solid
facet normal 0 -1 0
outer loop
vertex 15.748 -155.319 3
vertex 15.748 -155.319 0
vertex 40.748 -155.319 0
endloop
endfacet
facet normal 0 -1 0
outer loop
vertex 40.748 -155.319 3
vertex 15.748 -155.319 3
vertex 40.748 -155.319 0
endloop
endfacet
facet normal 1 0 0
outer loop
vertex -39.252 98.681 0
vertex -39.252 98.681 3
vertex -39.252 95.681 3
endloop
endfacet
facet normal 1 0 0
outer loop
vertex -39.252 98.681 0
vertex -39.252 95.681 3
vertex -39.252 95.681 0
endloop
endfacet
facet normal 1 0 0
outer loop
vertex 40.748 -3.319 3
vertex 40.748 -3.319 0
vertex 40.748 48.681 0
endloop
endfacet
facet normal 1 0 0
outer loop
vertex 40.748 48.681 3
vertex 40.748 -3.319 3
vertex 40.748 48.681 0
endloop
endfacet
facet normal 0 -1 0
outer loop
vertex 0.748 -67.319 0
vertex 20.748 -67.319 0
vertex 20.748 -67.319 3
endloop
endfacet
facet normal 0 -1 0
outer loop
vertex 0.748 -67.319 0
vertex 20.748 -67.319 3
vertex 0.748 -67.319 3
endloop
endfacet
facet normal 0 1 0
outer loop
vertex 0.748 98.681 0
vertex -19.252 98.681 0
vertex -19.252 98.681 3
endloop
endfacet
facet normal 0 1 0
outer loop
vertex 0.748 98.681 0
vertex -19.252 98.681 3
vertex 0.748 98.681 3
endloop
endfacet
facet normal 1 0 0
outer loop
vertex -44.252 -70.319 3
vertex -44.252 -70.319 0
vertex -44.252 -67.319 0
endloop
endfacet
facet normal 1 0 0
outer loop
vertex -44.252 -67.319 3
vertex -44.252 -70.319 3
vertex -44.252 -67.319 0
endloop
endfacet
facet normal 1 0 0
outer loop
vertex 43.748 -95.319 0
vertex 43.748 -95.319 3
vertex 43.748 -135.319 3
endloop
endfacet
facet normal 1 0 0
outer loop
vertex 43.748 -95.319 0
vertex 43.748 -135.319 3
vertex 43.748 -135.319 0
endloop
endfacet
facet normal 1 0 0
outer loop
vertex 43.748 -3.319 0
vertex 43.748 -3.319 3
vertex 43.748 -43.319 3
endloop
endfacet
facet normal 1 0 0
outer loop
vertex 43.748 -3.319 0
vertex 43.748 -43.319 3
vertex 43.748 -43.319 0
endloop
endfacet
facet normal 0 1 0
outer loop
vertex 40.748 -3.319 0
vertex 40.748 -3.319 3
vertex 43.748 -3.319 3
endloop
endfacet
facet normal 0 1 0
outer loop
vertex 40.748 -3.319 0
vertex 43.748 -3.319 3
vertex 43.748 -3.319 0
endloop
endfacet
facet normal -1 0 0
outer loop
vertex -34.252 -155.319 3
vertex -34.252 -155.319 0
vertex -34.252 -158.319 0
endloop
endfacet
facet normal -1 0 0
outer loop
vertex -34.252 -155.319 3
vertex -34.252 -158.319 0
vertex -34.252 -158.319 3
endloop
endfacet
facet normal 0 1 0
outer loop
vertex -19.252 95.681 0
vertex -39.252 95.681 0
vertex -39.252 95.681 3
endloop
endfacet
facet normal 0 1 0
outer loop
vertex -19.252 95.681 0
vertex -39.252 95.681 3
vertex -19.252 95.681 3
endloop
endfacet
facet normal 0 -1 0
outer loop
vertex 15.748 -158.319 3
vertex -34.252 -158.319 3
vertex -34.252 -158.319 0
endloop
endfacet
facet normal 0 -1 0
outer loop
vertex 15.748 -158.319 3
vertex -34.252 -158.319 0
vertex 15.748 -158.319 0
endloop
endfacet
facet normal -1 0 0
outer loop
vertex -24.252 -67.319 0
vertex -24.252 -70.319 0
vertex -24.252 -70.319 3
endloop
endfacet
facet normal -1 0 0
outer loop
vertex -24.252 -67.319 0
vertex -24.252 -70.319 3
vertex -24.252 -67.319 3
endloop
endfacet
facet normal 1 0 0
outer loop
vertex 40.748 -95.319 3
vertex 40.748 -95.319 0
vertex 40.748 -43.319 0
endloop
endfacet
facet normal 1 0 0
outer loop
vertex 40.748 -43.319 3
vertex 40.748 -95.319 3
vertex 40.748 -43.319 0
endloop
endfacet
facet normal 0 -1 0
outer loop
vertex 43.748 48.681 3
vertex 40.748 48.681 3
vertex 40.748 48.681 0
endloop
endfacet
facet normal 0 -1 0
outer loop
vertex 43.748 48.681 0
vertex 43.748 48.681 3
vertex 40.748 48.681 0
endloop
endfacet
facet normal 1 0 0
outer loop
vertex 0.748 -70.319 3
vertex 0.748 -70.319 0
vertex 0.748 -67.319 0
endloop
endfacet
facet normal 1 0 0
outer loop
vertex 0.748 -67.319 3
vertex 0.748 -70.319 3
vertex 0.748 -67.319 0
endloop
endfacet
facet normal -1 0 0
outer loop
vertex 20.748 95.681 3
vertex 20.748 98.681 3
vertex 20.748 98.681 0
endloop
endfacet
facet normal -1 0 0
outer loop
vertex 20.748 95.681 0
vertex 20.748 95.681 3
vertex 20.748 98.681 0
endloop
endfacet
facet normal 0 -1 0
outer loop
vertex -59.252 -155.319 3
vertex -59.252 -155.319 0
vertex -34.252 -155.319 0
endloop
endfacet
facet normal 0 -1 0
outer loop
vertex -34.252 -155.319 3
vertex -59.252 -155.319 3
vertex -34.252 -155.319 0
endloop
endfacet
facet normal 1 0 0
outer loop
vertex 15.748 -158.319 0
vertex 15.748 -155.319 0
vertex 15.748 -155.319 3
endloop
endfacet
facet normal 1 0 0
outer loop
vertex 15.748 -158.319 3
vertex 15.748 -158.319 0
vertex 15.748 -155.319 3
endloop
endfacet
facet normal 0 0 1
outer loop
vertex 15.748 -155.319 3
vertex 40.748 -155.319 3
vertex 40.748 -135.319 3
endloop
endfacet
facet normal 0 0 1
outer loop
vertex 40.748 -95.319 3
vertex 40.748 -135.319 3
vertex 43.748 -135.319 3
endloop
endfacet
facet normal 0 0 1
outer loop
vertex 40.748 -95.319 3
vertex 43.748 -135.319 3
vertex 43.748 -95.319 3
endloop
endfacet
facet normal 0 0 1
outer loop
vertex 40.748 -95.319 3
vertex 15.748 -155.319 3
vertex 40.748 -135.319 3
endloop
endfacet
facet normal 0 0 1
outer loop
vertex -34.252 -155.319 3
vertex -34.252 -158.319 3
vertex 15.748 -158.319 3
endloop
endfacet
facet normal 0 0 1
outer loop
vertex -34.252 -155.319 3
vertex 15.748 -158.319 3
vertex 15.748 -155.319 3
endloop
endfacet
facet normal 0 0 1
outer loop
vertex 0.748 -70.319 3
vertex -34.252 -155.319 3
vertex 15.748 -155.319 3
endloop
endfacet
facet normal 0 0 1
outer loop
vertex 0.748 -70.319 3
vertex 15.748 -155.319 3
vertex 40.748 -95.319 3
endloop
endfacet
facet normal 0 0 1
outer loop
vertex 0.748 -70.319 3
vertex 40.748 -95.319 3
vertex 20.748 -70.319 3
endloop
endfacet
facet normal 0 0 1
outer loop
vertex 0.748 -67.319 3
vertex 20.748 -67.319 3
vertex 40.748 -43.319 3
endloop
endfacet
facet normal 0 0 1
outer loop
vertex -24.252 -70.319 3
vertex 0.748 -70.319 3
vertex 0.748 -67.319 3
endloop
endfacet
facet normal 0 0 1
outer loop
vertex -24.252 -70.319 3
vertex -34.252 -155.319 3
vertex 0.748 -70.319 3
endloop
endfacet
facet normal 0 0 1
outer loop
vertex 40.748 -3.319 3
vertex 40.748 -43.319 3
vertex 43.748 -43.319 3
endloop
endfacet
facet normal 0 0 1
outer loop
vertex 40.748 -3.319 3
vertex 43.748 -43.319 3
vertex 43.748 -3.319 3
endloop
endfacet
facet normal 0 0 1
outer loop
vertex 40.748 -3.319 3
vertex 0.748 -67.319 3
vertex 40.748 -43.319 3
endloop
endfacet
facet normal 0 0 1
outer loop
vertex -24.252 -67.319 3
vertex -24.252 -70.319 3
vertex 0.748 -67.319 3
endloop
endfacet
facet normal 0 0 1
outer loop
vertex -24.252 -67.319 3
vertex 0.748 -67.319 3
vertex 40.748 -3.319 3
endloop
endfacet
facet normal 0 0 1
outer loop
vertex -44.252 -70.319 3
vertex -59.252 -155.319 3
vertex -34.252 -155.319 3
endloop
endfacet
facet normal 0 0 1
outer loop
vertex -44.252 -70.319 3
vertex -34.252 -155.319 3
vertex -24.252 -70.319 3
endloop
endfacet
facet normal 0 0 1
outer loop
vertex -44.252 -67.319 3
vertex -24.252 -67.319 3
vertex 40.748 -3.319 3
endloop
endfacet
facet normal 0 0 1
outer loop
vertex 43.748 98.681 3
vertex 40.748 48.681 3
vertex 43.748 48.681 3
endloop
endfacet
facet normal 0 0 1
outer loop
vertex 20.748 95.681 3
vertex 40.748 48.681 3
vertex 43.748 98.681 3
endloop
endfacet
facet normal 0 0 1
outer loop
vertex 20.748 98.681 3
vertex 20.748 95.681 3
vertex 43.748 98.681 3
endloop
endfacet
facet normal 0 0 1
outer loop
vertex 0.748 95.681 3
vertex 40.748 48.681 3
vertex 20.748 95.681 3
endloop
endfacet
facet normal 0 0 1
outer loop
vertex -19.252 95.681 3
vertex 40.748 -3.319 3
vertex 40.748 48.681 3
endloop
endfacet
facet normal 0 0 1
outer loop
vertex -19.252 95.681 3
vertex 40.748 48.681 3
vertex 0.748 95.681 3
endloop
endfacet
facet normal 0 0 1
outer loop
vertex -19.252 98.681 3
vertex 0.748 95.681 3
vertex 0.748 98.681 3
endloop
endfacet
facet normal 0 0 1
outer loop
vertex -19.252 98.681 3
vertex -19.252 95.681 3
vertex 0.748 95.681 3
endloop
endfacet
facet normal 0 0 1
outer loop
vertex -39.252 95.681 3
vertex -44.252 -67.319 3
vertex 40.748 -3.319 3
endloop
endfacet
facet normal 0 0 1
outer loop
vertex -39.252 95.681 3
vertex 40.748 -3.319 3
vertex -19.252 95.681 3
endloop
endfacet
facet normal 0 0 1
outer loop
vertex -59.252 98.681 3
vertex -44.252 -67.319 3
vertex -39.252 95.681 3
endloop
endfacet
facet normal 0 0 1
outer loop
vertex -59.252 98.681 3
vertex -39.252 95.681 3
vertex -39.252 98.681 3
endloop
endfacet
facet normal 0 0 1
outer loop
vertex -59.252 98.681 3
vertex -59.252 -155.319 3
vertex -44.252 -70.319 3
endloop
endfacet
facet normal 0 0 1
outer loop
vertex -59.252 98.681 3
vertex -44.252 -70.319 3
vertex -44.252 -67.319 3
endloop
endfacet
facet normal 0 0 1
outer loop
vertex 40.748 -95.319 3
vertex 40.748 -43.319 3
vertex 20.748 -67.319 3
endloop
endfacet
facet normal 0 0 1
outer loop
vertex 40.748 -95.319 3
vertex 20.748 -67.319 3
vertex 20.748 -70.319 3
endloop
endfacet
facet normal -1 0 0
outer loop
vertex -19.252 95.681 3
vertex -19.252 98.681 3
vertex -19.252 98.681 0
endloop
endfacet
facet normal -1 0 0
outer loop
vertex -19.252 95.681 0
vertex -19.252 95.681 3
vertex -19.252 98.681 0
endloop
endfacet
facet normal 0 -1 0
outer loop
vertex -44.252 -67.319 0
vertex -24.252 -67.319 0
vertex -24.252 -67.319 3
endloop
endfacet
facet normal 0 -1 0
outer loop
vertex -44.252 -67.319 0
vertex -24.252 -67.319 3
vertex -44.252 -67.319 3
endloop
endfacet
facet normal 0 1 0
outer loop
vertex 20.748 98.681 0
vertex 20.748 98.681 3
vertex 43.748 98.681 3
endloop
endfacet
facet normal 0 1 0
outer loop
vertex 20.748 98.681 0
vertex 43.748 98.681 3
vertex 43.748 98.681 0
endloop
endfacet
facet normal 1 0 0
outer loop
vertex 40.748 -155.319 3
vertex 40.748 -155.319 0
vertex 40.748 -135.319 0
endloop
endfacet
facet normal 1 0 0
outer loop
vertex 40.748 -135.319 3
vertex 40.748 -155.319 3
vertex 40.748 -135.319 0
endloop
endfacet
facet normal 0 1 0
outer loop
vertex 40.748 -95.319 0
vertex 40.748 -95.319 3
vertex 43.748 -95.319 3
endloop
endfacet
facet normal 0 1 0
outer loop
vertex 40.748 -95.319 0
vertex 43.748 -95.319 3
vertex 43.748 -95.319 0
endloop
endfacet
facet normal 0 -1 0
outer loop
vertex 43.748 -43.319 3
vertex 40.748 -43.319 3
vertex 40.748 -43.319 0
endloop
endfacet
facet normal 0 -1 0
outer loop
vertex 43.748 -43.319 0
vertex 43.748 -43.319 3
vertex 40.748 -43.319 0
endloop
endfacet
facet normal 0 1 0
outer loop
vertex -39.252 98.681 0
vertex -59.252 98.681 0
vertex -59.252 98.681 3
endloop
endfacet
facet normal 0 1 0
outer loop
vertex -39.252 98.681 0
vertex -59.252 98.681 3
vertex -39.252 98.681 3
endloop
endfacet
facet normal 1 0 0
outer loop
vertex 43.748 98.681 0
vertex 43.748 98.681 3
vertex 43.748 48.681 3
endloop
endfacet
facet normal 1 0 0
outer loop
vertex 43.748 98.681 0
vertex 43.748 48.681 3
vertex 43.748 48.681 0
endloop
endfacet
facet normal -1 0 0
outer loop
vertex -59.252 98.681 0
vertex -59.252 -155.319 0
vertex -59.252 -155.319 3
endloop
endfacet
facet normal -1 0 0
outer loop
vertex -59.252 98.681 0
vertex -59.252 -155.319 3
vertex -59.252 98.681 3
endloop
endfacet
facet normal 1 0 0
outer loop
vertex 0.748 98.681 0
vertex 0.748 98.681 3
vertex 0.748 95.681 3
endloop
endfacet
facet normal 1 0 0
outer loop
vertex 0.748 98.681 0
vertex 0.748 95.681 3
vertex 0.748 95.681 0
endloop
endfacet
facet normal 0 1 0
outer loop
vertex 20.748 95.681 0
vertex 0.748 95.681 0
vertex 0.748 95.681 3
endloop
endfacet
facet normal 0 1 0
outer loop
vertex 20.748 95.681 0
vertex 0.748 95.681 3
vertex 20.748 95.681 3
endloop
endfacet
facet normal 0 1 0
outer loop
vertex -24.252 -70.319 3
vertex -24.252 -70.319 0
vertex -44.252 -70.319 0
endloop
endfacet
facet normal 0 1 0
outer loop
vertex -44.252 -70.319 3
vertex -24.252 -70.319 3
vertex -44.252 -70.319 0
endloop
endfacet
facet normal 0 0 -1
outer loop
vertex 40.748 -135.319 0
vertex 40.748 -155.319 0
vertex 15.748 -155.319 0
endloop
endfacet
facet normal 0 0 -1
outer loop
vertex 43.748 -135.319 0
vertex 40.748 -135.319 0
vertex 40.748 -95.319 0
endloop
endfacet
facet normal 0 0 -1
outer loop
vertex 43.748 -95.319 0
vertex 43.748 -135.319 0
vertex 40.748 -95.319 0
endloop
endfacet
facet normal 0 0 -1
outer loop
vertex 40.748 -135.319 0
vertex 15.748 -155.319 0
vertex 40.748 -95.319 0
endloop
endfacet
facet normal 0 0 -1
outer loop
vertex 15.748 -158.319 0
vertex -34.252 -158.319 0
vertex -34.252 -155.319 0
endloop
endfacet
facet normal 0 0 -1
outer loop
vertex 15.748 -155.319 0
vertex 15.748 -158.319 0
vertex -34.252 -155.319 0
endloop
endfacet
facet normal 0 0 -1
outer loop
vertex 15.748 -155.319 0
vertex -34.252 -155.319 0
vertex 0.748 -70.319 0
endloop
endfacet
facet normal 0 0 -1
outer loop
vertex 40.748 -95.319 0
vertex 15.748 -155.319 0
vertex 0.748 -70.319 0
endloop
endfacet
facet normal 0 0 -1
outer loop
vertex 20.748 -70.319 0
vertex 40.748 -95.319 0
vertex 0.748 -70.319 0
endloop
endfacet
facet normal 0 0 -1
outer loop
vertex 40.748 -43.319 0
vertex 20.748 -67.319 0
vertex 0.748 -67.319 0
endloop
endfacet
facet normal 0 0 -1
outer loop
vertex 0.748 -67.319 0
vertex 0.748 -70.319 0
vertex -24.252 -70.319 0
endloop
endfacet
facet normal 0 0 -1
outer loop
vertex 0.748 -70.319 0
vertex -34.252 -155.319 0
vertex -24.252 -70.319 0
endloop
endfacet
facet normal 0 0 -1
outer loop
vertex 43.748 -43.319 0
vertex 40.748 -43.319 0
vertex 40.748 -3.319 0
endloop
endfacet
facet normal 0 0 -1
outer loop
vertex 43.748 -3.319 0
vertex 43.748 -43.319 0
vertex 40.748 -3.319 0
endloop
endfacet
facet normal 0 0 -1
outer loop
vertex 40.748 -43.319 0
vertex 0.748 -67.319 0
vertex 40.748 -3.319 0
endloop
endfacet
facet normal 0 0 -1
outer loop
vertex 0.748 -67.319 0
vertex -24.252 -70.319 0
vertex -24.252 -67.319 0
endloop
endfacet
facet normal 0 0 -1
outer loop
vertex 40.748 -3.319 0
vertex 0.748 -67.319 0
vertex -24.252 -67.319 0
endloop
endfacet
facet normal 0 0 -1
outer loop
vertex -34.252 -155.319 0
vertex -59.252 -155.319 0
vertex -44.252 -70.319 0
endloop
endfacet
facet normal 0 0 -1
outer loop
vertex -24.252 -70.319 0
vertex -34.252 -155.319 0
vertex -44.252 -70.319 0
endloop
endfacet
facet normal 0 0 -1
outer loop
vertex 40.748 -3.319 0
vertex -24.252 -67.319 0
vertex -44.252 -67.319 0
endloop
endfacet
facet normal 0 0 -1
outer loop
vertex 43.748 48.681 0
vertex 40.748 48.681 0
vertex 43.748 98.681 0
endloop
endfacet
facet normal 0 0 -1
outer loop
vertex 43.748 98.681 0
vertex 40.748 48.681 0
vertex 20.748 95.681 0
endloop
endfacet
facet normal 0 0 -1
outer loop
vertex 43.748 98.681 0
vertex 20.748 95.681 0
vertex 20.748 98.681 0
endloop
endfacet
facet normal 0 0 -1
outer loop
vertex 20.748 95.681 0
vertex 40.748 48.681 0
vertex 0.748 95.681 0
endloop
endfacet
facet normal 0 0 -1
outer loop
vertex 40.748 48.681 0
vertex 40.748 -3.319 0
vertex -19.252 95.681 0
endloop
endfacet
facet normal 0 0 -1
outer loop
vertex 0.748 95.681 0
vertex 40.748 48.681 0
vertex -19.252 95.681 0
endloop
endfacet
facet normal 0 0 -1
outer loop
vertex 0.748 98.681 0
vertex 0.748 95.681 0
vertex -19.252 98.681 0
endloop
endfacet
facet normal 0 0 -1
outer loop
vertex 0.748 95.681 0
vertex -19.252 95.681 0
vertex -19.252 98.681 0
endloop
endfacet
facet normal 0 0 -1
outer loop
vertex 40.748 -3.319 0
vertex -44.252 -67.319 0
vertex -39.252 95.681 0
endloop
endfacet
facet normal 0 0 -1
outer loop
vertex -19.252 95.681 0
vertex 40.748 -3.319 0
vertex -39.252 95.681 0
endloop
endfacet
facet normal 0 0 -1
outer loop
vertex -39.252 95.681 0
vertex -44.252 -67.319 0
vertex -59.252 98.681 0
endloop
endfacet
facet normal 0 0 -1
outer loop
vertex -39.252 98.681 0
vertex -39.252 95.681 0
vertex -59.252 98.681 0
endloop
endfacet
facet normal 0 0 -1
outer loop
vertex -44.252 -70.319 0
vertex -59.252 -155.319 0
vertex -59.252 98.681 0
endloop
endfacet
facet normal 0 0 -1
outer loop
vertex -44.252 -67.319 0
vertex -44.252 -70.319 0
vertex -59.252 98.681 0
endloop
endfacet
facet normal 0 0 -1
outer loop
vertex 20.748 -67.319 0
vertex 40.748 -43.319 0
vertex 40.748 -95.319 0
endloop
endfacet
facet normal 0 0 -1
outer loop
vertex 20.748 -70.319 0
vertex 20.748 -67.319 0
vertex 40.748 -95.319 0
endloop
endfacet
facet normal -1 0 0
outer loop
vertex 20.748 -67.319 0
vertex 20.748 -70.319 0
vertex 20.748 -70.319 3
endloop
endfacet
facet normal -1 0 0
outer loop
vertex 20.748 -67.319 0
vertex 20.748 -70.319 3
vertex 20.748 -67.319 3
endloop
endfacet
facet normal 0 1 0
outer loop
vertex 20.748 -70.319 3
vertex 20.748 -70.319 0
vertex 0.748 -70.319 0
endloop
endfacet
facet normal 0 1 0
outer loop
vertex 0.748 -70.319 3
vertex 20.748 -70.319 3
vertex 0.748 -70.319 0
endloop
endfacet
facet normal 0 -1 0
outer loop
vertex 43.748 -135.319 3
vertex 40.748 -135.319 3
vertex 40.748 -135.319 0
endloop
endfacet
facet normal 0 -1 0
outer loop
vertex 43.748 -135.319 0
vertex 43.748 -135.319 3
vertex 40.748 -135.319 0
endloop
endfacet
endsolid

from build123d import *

# Parameters (mm, degrees)
SKETCH1_W           = 100
SKETCH1_H           = 254
BOSS_EXTRUDE1_DEPTH = 3
SKETCH2_W           = 50
SKETCH2_H           = 3
BOSS_EXTRUDE2_DEPTH = 3
SKETCH3_W           = 20
SKETCH3_H           = 3
CUT_EXTRUDE1_DEPTH  = 3
SKETCH4_W           = 3
SKETCH4_H           = 40
SKETCH4_H_2         = 50
BOSS_EXTRUDE3_DEPTH = 3
SKETCH5_W           = 20
SKETCH5_H           = 3
CUT_EXTRUDE2_DEPTH  = 3


with BuildPart() as part:
    # Sketch1 → Boss-Extrude1 (new body)
    with BuildSketch(Plane.XY):
        with Locations((-9.252144082, -28.319039451)):
            Rectangle(SKETCH1_W, SKETCH1_H)
    extrude(amount=BOSS_EXTRUDE1_DEPTH)

    # Sketch2 → Boss-Extrude2 (add)
    with BuildSketch(Plane.XZ.offset(155.319039451)):
        with Locations((-9.252144082, 1.5)):
            Rectangle(SKETCH2_W, SKETCH2_H)
    extrude(amount=BOSS_EXTRUDE2_DEPTH)

    # Sketch3 → Cut-Extrude1 (cut)
    with BuildSketch(Plane(origin=(0, 98.680960549, 0), x_dir=(1, 0, 0), z_dir=(0, 1, 0))):
        with Locations((-29.252144082, -1.5)):
            Rectangle(SKETCH3_W, SKETCH3_H)
        with Locations((10.747855918, -1.5)):
            Rectangle(SKETCH3_W, SKETCH3_H)
    extrude(amount=-CUT_EXTRUDE1_DEPTH, mode=Mode.SUBTRACT)

    # Sketch4 → Boss-Extrude3 (add)
    with BuildSketch(Plane(origin=(40.747855918, 0, 0), x_dir=(0, 0, -1), z_dir=(1, 0, 0))):
        with Locations((-1.5, -115.319039451)):
            Rectangle(SKETCH4_W, SKETCH4_H)
        with Locations((-1.5, -23.319039451)):
            Rectangle(SKETCH4_W, SKETCH4_H)
        with Locations((-1.5, 73.680960549)):
            Rectangle(SKETCH4_W, SKETCH4_H_2)
    extrude(amount=BOSS_EXTRUDE3_DEPTH)

    # Sketch5 → Cut-Extrude2 (cut)
    with BuildSketch(Plane(origin=(0, 0, 0), x_dir=(-1, 0, 0), z_dir=(0, 0, -1))):
        with Locations((-10.747855918, -68.819039451)):
            Rectangle(SKETCH5_W, SKETCH5_H)
        with Locations((34.252144082, -68.819039451)):
            Rectangle(SKETCH5_W, SKETCH5_H)
    extrude(amount=-CUT_EXTRUDE2_DEPTH, mode=Mode.SUBTRACT)


solid = part.part
